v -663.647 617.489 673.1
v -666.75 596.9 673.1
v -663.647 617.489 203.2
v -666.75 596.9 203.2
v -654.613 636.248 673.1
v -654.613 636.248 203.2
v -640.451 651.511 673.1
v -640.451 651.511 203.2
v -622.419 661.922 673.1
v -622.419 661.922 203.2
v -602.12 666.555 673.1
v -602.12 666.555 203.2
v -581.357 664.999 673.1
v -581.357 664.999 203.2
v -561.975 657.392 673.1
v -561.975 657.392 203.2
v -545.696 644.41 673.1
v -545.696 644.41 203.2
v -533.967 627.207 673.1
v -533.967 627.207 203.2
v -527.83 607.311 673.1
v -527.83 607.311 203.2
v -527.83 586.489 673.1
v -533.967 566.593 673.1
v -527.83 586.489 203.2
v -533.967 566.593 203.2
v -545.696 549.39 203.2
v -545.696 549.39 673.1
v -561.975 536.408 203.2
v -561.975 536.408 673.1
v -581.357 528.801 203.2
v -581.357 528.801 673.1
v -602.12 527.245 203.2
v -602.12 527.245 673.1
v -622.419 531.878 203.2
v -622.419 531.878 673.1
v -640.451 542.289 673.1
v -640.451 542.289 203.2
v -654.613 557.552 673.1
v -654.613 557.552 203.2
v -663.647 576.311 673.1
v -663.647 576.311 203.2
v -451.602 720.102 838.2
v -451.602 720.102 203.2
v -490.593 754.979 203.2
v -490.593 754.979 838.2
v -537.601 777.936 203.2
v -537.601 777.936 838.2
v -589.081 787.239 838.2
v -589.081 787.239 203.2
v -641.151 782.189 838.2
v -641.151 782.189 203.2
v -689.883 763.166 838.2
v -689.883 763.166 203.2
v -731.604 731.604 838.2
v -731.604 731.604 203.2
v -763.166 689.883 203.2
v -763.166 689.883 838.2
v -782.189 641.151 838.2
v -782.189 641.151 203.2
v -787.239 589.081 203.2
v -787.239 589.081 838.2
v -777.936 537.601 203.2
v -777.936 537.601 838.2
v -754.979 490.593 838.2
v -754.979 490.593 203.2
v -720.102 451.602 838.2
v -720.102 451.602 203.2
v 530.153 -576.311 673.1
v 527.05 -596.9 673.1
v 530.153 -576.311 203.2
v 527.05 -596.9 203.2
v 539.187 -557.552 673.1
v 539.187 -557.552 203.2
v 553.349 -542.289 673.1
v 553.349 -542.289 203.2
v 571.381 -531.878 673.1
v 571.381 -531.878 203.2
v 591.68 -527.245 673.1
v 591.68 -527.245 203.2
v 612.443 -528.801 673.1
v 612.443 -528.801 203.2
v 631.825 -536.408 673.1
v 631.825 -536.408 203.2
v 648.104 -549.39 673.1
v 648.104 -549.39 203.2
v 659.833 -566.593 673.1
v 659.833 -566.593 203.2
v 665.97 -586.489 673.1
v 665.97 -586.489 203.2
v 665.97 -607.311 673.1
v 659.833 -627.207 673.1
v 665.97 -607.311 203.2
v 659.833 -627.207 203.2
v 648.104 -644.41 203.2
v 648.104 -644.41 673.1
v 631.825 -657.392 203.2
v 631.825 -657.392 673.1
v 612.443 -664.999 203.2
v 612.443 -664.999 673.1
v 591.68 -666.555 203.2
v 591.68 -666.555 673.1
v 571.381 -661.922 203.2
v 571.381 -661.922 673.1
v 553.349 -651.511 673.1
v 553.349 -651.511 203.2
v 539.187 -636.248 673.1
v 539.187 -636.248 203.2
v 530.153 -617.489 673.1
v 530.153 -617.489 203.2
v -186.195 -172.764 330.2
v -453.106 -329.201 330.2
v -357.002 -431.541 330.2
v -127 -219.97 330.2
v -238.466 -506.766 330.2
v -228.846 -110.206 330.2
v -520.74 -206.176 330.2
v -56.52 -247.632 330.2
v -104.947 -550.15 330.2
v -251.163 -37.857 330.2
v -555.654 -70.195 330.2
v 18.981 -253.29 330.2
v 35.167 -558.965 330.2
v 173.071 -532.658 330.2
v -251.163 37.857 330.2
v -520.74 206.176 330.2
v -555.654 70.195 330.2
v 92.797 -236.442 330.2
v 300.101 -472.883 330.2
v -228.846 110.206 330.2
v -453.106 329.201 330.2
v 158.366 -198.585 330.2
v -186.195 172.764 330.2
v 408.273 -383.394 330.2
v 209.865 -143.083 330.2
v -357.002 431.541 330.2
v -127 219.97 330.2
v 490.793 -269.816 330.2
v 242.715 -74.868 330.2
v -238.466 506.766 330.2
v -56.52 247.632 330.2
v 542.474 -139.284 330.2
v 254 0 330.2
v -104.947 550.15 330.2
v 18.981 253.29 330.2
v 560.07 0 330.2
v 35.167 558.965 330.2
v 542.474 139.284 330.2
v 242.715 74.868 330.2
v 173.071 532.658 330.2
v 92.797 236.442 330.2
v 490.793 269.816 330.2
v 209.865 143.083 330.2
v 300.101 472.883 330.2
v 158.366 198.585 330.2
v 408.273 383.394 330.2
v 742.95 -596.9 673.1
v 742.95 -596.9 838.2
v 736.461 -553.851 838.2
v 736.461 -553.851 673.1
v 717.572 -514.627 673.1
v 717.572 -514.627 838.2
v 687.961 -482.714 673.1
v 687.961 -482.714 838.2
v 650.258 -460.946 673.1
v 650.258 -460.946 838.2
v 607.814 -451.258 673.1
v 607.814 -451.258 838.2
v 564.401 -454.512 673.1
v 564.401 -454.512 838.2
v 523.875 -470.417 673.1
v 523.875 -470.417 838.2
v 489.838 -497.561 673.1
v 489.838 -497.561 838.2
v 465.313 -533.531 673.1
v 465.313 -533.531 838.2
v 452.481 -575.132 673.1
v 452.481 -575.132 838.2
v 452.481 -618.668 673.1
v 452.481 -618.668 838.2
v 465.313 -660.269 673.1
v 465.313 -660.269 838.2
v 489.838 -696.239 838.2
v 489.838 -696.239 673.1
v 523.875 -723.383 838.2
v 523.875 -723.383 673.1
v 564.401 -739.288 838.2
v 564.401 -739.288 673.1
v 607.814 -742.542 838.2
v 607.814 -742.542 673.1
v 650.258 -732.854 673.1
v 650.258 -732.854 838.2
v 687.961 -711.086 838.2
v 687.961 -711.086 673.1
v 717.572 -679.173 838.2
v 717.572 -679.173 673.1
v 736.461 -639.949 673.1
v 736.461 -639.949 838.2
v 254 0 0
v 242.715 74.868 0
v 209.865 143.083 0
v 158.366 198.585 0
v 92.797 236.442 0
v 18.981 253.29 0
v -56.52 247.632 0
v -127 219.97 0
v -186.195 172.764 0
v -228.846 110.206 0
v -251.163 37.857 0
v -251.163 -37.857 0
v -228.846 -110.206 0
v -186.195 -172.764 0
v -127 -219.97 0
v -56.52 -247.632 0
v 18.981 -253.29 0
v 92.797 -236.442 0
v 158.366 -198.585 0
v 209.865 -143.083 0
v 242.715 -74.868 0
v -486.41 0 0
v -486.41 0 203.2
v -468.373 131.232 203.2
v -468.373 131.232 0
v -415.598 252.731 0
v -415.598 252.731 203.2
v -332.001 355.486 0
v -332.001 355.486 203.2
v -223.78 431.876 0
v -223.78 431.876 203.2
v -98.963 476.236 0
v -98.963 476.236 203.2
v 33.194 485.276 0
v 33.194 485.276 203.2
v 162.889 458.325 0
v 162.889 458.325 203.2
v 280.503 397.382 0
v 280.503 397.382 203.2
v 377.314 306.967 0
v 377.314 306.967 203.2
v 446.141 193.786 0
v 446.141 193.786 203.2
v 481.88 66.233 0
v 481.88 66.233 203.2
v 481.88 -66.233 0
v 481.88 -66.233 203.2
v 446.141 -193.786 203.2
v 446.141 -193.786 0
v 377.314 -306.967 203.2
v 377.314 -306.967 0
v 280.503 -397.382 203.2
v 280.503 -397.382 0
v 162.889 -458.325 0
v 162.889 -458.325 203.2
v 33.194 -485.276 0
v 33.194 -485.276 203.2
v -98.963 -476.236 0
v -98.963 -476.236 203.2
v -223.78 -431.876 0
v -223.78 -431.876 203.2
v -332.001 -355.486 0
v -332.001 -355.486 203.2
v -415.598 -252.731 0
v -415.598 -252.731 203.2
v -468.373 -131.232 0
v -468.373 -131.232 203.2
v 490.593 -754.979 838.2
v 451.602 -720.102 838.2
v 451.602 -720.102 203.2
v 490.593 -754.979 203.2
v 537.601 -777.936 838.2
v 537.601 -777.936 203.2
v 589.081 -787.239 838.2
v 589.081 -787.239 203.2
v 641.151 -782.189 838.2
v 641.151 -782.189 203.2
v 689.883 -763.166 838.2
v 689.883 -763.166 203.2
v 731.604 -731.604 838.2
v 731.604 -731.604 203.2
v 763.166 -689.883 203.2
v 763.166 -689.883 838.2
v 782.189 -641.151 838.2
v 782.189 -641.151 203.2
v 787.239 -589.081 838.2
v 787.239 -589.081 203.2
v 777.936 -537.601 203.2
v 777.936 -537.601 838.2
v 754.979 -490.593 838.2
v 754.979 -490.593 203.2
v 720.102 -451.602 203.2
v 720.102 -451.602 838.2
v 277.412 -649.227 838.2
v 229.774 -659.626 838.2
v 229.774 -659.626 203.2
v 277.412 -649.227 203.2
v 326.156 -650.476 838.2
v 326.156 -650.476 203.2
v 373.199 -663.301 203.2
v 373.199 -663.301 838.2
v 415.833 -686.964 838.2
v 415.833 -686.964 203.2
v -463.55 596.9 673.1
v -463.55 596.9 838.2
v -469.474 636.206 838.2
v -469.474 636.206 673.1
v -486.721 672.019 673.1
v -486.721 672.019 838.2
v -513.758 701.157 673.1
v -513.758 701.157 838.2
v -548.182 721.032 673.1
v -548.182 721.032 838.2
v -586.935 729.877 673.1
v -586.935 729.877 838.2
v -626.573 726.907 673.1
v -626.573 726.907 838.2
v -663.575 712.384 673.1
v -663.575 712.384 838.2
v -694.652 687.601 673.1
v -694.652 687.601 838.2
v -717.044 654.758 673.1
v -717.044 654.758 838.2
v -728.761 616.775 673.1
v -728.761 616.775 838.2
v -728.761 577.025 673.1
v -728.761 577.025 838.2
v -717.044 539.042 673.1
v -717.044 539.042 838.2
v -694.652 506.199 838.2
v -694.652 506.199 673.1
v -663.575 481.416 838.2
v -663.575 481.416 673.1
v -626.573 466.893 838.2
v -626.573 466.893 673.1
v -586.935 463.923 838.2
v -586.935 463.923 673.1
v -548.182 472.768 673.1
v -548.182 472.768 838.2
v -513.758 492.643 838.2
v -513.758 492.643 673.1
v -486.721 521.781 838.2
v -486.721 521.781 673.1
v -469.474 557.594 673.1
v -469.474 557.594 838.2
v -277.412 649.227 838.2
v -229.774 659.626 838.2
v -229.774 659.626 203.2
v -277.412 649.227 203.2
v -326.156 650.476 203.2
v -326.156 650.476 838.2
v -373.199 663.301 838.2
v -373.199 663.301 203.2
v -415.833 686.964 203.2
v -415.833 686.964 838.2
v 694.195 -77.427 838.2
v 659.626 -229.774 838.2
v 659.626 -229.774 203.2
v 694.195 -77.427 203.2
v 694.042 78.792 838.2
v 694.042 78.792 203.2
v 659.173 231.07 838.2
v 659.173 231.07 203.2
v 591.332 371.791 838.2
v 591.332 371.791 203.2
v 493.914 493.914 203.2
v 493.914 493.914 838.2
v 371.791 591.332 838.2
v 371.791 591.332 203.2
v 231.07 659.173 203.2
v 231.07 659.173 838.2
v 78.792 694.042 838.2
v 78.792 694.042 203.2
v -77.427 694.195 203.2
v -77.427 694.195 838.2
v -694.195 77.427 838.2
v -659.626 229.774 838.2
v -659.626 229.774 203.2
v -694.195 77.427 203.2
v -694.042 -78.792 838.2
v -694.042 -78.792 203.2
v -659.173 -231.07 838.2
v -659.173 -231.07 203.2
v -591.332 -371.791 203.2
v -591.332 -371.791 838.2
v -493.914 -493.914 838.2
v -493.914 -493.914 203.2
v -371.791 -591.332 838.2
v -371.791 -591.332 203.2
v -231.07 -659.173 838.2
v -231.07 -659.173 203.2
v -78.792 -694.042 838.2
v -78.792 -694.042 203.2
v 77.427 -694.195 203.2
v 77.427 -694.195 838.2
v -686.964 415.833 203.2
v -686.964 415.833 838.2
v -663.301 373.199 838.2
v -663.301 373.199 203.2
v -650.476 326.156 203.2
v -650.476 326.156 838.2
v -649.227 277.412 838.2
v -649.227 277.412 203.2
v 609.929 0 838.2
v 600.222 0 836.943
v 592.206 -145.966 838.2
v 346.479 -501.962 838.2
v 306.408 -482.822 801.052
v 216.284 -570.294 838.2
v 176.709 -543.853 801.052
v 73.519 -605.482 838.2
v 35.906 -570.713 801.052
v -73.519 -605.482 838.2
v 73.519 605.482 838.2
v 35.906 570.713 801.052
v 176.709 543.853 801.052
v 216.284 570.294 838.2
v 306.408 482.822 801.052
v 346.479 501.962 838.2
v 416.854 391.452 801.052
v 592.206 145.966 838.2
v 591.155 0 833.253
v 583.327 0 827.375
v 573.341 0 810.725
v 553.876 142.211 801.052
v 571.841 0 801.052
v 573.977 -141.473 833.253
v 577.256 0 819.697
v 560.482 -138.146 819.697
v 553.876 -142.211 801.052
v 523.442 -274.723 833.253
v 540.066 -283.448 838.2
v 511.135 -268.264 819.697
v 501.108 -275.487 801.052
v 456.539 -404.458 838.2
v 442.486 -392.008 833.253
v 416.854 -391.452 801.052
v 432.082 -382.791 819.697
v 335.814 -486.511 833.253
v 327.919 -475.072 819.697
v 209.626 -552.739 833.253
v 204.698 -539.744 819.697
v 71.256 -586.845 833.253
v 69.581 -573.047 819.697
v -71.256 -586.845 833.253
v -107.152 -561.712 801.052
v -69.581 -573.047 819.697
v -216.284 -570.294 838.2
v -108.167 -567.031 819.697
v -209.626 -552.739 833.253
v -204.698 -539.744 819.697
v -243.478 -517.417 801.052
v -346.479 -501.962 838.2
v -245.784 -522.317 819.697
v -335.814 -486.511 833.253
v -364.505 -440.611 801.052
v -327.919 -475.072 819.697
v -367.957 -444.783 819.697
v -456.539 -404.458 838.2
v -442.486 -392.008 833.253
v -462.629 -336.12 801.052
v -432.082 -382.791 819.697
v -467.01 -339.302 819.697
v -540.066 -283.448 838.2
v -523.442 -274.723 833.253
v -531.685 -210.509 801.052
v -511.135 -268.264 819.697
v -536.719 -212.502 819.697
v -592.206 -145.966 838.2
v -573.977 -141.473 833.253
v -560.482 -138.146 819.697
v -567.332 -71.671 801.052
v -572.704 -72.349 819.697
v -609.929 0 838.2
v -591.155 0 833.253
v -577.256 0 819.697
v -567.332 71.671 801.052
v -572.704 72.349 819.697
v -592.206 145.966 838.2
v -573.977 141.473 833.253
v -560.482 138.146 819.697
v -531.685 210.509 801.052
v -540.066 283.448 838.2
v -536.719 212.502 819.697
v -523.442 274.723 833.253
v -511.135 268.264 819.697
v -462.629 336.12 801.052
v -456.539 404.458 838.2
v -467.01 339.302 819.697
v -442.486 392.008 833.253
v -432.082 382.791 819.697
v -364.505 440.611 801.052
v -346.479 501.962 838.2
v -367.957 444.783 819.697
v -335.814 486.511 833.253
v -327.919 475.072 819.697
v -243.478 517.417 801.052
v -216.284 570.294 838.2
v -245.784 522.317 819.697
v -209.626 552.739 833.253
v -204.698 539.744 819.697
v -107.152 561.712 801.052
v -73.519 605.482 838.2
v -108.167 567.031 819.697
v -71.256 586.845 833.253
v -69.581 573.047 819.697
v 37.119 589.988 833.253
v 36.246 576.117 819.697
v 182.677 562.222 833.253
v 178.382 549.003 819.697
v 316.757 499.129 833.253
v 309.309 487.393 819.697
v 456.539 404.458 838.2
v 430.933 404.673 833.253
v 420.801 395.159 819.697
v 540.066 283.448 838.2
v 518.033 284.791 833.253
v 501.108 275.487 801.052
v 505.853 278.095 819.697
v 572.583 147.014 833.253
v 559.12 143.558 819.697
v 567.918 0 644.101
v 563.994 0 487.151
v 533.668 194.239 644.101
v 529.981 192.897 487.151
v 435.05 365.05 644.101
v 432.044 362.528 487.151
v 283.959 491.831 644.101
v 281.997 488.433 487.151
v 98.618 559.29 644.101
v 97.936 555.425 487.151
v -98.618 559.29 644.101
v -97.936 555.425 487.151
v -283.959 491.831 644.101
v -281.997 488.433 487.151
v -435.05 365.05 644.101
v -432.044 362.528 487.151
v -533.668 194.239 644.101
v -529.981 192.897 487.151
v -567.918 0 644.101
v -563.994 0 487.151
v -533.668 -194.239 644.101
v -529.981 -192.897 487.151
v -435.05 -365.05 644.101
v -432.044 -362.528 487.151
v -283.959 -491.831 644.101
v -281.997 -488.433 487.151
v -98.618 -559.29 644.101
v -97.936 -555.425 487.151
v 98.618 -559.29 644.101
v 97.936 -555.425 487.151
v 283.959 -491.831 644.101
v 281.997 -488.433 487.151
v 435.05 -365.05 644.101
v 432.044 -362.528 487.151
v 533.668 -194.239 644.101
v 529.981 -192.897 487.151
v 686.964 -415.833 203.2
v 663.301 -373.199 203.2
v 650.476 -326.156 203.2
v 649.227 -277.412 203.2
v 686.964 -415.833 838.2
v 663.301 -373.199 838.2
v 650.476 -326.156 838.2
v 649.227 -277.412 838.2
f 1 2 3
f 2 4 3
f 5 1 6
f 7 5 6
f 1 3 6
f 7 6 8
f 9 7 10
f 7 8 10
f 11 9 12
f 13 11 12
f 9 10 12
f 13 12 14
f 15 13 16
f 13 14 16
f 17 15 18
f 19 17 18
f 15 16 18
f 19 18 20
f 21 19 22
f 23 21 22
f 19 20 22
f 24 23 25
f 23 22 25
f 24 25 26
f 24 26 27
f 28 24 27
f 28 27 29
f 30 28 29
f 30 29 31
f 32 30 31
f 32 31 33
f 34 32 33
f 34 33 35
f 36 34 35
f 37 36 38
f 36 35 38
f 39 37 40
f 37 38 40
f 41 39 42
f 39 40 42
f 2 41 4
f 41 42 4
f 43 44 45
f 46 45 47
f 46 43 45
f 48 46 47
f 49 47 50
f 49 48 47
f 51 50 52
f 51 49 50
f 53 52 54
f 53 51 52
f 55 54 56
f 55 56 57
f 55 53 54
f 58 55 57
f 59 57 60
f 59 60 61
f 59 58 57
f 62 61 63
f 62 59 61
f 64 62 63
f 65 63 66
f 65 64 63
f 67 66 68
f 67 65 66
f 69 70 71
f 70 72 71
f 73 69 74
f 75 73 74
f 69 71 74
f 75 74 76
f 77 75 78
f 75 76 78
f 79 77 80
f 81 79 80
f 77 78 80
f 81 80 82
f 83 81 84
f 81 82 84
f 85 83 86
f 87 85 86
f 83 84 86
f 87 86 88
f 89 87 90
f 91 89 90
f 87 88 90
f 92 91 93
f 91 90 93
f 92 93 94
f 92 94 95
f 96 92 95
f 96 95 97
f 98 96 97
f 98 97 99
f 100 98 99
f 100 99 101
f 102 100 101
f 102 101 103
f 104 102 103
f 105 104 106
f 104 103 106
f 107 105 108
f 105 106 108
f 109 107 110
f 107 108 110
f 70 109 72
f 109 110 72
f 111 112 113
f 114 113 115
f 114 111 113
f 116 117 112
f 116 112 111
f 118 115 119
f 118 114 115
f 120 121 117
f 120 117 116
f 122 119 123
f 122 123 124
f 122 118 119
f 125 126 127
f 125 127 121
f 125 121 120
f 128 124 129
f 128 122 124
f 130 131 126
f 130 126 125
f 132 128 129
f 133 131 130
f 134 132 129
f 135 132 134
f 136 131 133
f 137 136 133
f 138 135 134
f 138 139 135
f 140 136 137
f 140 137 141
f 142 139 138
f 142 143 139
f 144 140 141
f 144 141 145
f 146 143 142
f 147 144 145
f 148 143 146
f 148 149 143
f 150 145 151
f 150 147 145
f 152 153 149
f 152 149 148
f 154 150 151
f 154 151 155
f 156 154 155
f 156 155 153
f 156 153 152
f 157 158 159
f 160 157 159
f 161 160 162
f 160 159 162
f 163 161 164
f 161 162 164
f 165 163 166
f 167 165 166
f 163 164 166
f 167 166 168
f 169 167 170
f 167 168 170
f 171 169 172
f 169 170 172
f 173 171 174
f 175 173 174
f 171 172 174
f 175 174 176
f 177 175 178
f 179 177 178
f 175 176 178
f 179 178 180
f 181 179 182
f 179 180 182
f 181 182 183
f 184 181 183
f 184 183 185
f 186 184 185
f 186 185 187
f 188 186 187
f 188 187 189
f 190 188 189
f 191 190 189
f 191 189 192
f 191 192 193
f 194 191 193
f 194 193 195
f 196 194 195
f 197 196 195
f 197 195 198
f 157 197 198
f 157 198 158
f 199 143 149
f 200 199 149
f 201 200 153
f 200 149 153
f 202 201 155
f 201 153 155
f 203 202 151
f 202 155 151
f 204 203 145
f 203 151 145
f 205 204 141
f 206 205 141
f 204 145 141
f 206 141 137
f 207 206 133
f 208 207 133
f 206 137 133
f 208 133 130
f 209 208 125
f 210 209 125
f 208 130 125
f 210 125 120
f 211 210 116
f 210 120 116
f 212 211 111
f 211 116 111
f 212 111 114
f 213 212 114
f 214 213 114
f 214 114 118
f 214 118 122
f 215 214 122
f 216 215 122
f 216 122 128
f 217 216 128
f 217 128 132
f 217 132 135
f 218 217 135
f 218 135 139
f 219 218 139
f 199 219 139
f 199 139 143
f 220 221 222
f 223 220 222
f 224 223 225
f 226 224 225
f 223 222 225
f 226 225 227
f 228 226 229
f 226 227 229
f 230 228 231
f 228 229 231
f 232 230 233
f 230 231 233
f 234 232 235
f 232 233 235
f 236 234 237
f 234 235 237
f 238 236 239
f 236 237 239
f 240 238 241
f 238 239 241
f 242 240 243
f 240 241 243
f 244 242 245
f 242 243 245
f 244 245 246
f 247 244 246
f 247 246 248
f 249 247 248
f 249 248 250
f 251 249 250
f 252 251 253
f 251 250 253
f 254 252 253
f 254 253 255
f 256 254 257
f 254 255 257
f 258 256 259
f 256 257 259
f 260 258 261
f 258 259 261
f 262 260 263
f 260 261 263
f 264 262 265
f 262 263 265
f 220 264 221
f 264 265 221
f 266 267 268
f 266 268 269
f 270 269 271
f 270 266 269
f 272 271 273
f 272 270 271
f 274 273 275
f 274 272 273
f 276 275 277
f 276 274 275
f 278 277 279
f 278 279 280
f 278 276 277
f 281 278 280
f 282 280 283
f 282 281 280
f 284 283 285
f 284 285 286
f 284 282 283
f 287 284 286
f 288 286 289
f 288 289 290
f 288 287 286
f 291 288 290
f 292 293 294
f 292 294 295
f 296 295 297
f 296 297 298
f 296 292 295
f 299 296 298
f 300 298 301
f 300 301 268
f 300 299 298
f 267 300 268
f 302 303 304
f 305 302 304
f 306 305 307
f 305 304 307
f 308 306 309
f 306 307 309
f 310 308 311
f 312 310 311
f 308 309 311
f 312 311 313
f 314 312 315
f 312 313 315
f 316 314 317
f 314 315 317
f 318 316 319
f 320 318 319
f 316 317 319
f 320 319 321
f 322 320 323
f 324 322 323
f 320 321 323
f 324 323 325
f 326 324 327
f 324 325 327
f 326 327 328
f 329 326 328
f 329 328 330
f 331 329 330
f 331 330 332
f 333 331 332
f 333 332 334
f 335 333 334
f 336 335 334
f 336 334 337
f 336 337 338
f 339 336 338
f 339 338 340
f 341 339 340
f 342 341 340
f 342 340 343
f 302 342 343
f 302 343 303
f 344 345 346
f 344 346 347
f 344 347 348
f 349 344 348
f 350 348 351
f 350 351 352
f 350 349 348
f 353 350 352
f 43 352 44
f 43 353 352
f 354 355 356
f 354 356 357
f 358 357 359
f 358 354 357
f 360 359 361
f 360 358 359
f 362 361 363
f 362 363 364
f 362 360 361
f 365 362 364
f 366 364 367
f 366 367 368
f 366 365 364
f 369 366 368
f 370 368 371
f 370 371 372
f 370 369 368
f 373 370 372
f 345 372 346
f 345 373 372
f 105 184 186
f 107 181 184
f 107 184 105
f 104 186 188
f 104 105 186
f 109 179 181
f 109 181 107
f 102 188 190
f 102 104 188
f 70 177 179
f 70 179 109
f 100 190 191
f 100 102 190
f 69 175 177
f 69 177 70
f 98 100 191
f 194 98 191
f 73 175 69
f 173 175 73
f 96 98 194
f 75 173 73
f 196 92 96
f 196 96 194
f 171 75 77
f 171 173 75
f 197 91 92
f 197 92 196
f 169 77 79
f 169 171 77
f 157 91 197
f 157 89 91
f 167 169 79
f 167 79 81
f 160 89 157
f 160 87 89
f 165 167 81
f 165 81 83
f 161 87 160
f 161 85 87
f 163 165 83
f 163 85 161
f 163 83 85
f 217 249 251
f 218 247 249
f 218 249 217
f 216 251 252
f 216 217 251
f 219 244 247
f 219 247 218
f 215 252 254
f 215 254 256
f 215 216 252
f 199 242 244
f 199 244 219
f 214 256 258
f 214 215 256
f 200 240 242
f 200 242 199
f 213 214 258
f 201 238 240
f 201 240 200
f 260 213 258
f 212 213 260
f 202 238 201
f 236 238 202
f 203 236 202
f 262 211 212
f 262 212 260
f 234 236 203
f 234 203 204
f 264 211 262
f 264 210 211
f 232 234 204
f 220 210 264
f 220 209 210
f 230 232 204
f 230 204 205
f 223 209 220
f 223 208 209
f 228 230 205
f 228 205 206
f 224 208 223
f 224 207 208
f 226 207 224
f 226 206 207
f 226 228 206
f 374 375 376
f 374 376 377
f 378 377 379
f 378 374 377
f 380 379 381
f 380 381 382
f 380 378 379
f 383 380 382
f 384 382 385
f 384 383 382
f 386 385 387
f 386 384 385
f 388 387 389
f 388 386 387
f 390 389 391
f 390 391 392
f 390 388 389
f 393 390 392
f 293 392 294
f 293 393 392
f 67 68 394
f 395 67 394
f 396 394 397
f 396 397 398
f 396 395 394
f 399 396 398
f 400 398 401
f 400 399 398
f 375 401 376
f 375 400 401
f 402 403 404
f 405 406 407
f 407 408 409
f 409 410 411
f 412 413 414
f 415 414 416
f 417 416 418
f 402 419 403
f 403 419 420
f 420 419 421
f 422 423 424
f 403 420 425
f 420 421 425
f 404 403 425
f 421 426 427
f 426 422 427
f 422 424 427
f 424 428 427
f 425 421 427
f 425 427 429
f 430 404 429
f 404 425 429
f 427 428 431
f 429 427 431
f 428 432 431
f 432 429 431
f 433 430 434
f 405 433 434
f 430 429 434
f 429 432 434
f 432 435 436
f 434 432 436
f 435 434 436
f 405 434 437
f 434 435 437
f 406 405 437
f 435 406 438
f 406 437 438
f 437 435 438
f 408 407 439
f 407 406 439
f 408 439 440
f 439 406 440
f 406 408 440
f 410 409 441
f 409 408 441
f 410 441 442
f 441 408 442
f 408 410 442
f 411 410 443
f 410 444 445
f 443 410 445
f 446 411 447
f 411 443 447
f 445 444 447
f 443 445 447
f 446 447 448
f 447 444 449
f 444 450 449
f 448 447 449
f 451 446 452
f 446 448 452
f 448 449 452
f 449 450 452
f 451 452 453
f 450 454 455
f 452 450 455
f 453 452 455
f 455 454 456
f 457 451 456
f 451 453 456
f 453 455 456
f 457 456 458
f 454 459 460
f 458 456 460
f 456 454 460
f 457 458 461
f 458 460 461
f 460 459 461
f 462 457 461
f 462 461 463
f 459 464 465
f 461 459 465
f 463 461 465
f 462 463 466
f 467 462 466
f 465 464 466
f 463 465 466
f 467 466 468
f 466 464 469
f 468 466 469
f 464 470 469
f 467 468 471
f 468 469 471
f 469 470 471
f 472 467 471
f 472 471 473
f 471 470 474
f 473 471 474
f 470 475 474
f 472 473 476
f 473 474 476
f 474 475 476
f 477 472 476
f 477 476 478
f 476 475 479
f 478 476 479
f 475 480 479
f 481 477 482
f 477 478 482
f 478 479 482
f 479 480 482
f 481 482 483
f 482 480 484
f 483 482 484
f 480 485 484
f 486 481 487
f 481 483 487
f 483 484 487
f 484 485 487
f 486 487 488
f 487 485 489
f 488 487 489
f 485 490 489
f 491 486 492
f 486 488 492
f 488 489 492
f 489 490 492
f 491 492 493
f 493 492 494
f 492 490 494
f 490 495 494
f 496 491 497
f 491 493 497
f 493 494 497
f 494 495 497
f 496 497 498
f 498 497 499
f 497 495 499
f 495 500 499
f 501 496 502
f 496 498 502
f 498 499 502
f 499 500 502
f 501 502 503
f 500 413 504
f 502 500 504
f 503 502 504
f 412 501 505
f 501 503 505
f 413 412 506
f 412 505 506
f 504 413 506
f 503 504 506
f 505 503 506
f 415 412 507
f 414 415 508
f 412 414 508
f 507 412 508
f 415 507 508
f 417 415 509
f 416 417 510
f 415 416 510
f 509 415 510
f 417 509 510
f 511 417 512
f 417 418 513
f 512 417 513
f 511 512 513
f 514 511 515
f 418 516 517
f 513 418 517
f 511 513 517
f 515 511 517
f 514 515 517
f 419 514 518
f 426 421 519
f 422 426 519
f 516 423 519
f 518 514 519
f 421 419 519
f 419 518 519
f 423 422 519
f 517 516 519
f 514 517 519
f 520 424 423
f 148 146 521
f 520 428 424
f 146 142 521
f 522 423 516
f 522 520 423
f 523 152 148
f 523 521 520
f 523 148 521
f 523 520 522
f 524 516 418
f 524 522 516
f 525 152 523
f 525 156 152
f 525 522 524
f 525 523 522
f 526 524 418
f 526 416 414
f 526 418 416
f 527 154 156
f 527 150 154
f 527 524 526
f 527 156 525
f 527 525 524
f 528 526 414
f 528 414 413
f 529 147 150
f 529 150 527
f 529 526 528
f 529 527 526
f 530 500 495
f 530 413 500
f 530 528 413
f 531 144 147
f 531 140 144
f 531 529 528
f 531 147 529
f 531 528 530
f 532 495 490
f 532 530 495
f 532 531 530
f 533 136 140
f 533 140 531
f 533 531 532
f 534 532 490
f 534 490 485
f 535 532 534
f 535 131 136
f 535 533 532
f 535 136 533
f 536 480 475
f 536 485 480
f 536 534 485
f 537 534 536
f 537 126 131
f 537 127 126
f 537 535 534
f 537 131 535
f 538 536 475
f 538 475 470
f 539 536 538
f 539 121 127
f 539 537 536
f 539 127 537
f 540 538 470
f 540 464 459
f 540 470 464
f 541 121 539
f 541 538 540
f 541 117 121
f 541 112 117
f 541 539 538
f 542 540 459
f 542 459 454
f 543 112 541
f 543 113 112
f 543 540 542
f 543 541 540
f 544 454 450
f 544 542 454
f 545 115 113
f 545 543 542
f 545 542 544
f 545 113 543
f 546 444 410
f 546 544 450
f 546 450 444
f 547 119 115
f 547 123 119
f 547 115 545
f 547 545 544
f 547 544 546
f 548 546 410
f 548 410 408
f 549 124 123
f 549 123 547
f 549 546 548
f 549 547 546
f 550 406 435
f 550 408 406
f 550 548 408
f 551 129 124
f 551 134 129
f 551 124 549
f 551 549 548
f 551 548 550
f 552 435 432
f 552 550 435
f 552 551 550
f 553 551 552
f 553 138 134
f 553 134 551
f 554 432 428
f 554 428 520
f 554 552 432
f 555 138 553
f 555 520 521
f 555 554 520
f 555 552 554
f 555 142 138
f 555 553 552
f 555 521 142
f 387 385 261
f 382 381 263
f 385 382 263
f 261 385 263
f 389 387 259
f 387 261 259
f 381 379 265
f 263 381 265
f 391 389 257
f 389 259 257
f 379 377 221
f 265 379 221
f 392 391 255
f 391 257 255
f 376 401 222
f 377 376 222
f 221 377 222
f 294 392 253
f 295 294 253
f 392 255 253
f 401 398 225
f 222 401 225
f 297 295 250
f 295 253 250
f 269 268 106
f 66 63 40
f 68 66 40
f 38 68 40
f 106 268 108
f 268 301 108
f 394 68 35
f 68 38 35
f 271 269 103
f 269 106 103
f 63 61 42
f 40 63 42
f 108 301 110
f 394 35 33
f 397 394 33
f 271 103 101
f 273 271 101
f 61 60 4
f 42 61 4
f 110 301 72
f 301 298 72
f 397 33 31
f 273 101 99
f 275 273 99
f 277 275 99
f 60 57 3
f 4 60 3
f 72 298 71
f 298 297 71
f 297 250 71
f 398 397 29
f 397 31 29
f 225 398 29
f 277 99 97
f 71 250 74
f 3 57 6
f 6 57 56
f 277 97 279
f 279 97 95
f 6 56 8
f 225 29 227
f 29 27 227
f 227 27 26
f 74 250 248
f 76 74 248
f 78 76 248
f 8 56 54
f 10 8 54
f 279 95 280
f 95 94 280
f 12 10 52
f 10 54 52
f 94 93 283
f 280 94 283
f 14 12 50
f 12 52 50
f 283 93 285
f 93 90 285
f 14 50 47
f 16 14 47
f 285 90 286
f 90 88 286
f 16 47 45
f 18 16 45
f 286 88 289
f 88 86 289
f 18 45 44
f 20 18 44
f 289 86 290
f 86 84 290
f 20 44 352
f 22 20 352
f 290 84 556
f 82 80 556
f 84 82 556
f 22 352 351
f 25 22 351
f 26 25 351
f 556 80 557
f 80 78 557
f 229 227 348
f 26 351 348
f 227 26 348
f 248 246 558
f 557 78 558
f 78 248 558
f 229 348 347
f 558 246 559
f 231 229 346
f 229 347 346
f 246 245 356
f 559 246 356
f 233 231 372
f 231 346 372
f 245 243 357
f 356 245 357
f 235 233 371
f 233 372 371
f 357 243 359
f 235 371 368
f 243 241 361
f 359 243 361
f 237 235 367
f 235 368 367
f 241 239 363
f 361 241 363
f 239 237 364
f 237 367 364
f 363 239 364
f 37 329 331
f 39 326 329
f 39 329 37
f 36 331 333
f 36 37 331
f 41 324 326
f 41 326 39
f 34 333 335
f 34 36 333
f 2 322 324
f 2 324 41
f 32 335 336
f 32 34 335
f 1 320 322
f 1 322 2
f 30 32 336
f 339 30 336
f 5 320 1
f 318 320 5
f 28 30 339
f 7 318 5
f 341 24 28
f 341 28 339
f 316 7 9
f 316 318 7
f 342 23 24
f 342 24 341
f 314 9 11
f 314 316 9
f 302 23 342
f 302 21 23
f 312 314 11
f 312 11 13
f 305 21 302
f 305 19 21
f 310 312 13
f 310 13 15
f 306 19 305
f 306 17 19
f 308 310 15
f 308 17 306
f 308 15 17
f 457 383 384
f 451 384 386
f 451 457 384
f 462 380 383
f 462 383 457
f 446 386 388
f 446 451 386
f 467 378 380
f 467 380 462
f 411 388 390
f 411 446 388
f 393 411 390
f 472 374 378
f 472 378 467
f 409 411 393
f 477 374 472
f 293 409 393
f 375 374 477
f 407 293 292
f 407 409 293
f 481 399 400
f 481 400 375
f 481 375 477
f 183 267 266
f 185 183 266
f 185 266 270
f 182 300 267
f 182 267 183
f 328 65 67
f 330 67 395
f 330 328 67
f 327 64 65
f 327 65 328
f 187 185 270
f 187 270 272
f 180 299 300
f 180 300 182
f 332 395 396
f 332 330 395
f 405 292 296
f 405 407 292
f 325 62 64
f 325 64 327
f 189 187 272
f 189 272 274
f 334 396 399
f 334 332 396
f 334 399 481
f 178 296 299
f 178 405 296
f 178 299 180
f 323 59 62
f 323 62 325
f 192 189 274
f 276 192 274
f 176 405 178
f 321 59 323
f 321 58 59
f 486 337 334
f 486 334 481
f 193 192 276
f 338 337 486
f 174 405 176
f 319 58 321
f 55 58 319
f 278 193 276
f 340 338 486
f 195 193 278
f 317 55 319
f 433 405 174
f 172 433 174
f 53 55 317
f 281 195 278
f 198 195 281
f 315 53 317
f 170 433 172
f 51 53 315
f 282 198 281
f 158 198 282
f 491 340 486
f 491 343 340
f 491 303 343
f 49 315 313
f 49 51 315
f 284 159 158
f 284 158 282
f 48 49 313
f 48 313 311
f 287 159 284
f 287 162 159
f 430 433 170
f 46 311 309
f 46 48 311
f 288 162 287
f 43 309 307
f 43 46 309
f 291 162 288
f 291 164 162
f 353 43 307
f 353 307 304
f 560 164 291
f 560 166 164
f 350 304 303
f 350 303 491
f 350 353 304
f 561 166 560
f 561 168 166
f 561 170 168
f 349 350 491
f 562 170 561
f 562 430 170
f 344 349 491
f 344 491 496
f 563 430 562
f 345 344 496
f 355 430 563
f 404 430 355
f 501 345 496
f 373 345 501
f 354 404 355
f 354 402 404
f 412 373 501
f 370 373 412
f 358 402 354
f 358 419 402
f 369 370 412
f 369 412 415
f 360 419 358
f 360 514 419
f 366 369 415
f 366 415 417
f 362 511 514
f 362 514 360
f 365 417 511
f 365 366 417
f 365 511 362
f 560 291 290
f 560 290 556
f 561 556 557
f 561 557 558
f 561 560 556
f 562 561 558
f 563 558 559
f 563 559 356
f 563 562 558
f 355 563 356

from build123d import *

# Parameters (mm, degrees)
BOSS_EXTRU_1_DEPTH      = 635
ESQUISSE2_R             = 486.41
BOSS_EXTRU_2_DEPTH      = 203.2
ESQUISSE3_R             = 572.77
ENL_V_MAT_EXTRU_1_DEPTH = 508
ENL_V_MAT_EXTRU_1_TAPER = 1.432096184
ESQUISSE4_R             = 254
ENL_V_MAT_EXTRU_2_DEPTH = 331.2
PER_AGE1_D              = 139.7
PER_AGE1_DEPTH          = 838.2
PER_AGE1_CBORE_D        = 292.1
PER_AGE1_CBORE_DEPTH    = 165.1
PER_AGE2_D              = 139.7
PER_AGE2_DEPTH          = 838.2
PER_AGE2_CBORE_D        = 266.7
PER_AGE2_CBORE_DEPTH    = 165.1
CONG_1_R                = 38.1


with BuildPart() as part:
    # Esquisse1 → Boss.-Extru.1 (new body)
    with BuildSketch(Plane.XY.offset(838.2)):
        with BuildLine():
            ThreePointArc((-229.773752251, 659.625858177), (-350.063866609, 655.471932336), (-451.601786597, 720.101782381))
            ThreePointArc((-451.601786597, 720.101782381), (-731.603841816, 731.603841816), (-720.101782381, 451.601786597))
            ThreePointArc((-720.101782381, 451.601786597), (-655.471932336, 350.063866609), (-659.625858178, 229.773752251))
            ThreePointArc((-659.625858178, 229.773752251), (-493.914086659, -493.914086659), (229.773752251, -659.625858178))
            ThreePointArc((229.773752251, -659.625858178), (350.063866609, -655.471932336), (451.601786596, -720.101782381))
            ThreePointArc((451.601786596, -720.101782381), (731.603841816, -731.603841816), (720.101782381, -451.601786596))
            ThreePointArc((720.101782381, -451.601786596), (655.471932336, -350.063866609), (659.625858178, -229.773752251))
            ThreePointArc((659.625858178, -229.773752251), (493.914086659, 493.914086659), (-229.773752251, 659.625858177))
        make_face()
    extrude(amount=-BOSS_EXTRU_1_DEPTH)

    # Esquisse2 → Boss.-Extru.2 (add)
    with BuildSketch(Plane(origin=(0, 0, 203.2), x_dir=(-1, 0, 0), z_dir=(0, 0, -1))):
        Circle(ESQUISSE2_R)
    extrude(amount=BOSS_EXTRU_2_DEPTH)

    # Esquisse3 → Enlèv. mat.-Extru.1 (cut)
    with BuildSketch(Plane.XY.offset(838.2)):
        Circle(ESQUISSE3_R)
    extrude(amount=-ENL_V_MAT_EXTRU_1_DEPTH, taper=ENL_V_MAT_EXTRU_1_TAPER, mode=Mode.SUBTRACT)

    # Esquisse4 → Enlèv. mat.-Extru.2 (cut, through all)
    with BuildSketch(Plane.XY.offset(330.2)):
        Circle(ESQUISSE4_R)
    extrude(amount=-ENL_V_MAT_EXTRU_2_DEPTH, mode=Mode.SUBTRACT)

    # Perçage1
    with Locations(Plane.XY.offset(838.2)):
        with Locations((596.9, -596.9)):
            CounterBoreHole(PER_AGE1_D / 2, PER_AGE1_CBORE_D / 2, PER_AGE1_CBORE_DEPTH, depth=PER_AGE1_DEPTH)

    # Perçage2
    with Locations(Plane.XY.offset(838.2)):
        with Locations((-596.9, 596.9)):
            CounterBoreHole(PER_AGE2_D / 2, PER_AGE2_CBORE_D / 2, PER_AGE2_CBORE_DEPTH, depth=PER_AGE2_DEPTH)

    # Congé1
    cong_1_edges = [part.edges().sort_by_distance(p)[0] for p in [
        (-572.77, 0, 838.2),
    ]]
    fillet(cong_1_edges, radius=CONG_1_R)


solid = part.part
